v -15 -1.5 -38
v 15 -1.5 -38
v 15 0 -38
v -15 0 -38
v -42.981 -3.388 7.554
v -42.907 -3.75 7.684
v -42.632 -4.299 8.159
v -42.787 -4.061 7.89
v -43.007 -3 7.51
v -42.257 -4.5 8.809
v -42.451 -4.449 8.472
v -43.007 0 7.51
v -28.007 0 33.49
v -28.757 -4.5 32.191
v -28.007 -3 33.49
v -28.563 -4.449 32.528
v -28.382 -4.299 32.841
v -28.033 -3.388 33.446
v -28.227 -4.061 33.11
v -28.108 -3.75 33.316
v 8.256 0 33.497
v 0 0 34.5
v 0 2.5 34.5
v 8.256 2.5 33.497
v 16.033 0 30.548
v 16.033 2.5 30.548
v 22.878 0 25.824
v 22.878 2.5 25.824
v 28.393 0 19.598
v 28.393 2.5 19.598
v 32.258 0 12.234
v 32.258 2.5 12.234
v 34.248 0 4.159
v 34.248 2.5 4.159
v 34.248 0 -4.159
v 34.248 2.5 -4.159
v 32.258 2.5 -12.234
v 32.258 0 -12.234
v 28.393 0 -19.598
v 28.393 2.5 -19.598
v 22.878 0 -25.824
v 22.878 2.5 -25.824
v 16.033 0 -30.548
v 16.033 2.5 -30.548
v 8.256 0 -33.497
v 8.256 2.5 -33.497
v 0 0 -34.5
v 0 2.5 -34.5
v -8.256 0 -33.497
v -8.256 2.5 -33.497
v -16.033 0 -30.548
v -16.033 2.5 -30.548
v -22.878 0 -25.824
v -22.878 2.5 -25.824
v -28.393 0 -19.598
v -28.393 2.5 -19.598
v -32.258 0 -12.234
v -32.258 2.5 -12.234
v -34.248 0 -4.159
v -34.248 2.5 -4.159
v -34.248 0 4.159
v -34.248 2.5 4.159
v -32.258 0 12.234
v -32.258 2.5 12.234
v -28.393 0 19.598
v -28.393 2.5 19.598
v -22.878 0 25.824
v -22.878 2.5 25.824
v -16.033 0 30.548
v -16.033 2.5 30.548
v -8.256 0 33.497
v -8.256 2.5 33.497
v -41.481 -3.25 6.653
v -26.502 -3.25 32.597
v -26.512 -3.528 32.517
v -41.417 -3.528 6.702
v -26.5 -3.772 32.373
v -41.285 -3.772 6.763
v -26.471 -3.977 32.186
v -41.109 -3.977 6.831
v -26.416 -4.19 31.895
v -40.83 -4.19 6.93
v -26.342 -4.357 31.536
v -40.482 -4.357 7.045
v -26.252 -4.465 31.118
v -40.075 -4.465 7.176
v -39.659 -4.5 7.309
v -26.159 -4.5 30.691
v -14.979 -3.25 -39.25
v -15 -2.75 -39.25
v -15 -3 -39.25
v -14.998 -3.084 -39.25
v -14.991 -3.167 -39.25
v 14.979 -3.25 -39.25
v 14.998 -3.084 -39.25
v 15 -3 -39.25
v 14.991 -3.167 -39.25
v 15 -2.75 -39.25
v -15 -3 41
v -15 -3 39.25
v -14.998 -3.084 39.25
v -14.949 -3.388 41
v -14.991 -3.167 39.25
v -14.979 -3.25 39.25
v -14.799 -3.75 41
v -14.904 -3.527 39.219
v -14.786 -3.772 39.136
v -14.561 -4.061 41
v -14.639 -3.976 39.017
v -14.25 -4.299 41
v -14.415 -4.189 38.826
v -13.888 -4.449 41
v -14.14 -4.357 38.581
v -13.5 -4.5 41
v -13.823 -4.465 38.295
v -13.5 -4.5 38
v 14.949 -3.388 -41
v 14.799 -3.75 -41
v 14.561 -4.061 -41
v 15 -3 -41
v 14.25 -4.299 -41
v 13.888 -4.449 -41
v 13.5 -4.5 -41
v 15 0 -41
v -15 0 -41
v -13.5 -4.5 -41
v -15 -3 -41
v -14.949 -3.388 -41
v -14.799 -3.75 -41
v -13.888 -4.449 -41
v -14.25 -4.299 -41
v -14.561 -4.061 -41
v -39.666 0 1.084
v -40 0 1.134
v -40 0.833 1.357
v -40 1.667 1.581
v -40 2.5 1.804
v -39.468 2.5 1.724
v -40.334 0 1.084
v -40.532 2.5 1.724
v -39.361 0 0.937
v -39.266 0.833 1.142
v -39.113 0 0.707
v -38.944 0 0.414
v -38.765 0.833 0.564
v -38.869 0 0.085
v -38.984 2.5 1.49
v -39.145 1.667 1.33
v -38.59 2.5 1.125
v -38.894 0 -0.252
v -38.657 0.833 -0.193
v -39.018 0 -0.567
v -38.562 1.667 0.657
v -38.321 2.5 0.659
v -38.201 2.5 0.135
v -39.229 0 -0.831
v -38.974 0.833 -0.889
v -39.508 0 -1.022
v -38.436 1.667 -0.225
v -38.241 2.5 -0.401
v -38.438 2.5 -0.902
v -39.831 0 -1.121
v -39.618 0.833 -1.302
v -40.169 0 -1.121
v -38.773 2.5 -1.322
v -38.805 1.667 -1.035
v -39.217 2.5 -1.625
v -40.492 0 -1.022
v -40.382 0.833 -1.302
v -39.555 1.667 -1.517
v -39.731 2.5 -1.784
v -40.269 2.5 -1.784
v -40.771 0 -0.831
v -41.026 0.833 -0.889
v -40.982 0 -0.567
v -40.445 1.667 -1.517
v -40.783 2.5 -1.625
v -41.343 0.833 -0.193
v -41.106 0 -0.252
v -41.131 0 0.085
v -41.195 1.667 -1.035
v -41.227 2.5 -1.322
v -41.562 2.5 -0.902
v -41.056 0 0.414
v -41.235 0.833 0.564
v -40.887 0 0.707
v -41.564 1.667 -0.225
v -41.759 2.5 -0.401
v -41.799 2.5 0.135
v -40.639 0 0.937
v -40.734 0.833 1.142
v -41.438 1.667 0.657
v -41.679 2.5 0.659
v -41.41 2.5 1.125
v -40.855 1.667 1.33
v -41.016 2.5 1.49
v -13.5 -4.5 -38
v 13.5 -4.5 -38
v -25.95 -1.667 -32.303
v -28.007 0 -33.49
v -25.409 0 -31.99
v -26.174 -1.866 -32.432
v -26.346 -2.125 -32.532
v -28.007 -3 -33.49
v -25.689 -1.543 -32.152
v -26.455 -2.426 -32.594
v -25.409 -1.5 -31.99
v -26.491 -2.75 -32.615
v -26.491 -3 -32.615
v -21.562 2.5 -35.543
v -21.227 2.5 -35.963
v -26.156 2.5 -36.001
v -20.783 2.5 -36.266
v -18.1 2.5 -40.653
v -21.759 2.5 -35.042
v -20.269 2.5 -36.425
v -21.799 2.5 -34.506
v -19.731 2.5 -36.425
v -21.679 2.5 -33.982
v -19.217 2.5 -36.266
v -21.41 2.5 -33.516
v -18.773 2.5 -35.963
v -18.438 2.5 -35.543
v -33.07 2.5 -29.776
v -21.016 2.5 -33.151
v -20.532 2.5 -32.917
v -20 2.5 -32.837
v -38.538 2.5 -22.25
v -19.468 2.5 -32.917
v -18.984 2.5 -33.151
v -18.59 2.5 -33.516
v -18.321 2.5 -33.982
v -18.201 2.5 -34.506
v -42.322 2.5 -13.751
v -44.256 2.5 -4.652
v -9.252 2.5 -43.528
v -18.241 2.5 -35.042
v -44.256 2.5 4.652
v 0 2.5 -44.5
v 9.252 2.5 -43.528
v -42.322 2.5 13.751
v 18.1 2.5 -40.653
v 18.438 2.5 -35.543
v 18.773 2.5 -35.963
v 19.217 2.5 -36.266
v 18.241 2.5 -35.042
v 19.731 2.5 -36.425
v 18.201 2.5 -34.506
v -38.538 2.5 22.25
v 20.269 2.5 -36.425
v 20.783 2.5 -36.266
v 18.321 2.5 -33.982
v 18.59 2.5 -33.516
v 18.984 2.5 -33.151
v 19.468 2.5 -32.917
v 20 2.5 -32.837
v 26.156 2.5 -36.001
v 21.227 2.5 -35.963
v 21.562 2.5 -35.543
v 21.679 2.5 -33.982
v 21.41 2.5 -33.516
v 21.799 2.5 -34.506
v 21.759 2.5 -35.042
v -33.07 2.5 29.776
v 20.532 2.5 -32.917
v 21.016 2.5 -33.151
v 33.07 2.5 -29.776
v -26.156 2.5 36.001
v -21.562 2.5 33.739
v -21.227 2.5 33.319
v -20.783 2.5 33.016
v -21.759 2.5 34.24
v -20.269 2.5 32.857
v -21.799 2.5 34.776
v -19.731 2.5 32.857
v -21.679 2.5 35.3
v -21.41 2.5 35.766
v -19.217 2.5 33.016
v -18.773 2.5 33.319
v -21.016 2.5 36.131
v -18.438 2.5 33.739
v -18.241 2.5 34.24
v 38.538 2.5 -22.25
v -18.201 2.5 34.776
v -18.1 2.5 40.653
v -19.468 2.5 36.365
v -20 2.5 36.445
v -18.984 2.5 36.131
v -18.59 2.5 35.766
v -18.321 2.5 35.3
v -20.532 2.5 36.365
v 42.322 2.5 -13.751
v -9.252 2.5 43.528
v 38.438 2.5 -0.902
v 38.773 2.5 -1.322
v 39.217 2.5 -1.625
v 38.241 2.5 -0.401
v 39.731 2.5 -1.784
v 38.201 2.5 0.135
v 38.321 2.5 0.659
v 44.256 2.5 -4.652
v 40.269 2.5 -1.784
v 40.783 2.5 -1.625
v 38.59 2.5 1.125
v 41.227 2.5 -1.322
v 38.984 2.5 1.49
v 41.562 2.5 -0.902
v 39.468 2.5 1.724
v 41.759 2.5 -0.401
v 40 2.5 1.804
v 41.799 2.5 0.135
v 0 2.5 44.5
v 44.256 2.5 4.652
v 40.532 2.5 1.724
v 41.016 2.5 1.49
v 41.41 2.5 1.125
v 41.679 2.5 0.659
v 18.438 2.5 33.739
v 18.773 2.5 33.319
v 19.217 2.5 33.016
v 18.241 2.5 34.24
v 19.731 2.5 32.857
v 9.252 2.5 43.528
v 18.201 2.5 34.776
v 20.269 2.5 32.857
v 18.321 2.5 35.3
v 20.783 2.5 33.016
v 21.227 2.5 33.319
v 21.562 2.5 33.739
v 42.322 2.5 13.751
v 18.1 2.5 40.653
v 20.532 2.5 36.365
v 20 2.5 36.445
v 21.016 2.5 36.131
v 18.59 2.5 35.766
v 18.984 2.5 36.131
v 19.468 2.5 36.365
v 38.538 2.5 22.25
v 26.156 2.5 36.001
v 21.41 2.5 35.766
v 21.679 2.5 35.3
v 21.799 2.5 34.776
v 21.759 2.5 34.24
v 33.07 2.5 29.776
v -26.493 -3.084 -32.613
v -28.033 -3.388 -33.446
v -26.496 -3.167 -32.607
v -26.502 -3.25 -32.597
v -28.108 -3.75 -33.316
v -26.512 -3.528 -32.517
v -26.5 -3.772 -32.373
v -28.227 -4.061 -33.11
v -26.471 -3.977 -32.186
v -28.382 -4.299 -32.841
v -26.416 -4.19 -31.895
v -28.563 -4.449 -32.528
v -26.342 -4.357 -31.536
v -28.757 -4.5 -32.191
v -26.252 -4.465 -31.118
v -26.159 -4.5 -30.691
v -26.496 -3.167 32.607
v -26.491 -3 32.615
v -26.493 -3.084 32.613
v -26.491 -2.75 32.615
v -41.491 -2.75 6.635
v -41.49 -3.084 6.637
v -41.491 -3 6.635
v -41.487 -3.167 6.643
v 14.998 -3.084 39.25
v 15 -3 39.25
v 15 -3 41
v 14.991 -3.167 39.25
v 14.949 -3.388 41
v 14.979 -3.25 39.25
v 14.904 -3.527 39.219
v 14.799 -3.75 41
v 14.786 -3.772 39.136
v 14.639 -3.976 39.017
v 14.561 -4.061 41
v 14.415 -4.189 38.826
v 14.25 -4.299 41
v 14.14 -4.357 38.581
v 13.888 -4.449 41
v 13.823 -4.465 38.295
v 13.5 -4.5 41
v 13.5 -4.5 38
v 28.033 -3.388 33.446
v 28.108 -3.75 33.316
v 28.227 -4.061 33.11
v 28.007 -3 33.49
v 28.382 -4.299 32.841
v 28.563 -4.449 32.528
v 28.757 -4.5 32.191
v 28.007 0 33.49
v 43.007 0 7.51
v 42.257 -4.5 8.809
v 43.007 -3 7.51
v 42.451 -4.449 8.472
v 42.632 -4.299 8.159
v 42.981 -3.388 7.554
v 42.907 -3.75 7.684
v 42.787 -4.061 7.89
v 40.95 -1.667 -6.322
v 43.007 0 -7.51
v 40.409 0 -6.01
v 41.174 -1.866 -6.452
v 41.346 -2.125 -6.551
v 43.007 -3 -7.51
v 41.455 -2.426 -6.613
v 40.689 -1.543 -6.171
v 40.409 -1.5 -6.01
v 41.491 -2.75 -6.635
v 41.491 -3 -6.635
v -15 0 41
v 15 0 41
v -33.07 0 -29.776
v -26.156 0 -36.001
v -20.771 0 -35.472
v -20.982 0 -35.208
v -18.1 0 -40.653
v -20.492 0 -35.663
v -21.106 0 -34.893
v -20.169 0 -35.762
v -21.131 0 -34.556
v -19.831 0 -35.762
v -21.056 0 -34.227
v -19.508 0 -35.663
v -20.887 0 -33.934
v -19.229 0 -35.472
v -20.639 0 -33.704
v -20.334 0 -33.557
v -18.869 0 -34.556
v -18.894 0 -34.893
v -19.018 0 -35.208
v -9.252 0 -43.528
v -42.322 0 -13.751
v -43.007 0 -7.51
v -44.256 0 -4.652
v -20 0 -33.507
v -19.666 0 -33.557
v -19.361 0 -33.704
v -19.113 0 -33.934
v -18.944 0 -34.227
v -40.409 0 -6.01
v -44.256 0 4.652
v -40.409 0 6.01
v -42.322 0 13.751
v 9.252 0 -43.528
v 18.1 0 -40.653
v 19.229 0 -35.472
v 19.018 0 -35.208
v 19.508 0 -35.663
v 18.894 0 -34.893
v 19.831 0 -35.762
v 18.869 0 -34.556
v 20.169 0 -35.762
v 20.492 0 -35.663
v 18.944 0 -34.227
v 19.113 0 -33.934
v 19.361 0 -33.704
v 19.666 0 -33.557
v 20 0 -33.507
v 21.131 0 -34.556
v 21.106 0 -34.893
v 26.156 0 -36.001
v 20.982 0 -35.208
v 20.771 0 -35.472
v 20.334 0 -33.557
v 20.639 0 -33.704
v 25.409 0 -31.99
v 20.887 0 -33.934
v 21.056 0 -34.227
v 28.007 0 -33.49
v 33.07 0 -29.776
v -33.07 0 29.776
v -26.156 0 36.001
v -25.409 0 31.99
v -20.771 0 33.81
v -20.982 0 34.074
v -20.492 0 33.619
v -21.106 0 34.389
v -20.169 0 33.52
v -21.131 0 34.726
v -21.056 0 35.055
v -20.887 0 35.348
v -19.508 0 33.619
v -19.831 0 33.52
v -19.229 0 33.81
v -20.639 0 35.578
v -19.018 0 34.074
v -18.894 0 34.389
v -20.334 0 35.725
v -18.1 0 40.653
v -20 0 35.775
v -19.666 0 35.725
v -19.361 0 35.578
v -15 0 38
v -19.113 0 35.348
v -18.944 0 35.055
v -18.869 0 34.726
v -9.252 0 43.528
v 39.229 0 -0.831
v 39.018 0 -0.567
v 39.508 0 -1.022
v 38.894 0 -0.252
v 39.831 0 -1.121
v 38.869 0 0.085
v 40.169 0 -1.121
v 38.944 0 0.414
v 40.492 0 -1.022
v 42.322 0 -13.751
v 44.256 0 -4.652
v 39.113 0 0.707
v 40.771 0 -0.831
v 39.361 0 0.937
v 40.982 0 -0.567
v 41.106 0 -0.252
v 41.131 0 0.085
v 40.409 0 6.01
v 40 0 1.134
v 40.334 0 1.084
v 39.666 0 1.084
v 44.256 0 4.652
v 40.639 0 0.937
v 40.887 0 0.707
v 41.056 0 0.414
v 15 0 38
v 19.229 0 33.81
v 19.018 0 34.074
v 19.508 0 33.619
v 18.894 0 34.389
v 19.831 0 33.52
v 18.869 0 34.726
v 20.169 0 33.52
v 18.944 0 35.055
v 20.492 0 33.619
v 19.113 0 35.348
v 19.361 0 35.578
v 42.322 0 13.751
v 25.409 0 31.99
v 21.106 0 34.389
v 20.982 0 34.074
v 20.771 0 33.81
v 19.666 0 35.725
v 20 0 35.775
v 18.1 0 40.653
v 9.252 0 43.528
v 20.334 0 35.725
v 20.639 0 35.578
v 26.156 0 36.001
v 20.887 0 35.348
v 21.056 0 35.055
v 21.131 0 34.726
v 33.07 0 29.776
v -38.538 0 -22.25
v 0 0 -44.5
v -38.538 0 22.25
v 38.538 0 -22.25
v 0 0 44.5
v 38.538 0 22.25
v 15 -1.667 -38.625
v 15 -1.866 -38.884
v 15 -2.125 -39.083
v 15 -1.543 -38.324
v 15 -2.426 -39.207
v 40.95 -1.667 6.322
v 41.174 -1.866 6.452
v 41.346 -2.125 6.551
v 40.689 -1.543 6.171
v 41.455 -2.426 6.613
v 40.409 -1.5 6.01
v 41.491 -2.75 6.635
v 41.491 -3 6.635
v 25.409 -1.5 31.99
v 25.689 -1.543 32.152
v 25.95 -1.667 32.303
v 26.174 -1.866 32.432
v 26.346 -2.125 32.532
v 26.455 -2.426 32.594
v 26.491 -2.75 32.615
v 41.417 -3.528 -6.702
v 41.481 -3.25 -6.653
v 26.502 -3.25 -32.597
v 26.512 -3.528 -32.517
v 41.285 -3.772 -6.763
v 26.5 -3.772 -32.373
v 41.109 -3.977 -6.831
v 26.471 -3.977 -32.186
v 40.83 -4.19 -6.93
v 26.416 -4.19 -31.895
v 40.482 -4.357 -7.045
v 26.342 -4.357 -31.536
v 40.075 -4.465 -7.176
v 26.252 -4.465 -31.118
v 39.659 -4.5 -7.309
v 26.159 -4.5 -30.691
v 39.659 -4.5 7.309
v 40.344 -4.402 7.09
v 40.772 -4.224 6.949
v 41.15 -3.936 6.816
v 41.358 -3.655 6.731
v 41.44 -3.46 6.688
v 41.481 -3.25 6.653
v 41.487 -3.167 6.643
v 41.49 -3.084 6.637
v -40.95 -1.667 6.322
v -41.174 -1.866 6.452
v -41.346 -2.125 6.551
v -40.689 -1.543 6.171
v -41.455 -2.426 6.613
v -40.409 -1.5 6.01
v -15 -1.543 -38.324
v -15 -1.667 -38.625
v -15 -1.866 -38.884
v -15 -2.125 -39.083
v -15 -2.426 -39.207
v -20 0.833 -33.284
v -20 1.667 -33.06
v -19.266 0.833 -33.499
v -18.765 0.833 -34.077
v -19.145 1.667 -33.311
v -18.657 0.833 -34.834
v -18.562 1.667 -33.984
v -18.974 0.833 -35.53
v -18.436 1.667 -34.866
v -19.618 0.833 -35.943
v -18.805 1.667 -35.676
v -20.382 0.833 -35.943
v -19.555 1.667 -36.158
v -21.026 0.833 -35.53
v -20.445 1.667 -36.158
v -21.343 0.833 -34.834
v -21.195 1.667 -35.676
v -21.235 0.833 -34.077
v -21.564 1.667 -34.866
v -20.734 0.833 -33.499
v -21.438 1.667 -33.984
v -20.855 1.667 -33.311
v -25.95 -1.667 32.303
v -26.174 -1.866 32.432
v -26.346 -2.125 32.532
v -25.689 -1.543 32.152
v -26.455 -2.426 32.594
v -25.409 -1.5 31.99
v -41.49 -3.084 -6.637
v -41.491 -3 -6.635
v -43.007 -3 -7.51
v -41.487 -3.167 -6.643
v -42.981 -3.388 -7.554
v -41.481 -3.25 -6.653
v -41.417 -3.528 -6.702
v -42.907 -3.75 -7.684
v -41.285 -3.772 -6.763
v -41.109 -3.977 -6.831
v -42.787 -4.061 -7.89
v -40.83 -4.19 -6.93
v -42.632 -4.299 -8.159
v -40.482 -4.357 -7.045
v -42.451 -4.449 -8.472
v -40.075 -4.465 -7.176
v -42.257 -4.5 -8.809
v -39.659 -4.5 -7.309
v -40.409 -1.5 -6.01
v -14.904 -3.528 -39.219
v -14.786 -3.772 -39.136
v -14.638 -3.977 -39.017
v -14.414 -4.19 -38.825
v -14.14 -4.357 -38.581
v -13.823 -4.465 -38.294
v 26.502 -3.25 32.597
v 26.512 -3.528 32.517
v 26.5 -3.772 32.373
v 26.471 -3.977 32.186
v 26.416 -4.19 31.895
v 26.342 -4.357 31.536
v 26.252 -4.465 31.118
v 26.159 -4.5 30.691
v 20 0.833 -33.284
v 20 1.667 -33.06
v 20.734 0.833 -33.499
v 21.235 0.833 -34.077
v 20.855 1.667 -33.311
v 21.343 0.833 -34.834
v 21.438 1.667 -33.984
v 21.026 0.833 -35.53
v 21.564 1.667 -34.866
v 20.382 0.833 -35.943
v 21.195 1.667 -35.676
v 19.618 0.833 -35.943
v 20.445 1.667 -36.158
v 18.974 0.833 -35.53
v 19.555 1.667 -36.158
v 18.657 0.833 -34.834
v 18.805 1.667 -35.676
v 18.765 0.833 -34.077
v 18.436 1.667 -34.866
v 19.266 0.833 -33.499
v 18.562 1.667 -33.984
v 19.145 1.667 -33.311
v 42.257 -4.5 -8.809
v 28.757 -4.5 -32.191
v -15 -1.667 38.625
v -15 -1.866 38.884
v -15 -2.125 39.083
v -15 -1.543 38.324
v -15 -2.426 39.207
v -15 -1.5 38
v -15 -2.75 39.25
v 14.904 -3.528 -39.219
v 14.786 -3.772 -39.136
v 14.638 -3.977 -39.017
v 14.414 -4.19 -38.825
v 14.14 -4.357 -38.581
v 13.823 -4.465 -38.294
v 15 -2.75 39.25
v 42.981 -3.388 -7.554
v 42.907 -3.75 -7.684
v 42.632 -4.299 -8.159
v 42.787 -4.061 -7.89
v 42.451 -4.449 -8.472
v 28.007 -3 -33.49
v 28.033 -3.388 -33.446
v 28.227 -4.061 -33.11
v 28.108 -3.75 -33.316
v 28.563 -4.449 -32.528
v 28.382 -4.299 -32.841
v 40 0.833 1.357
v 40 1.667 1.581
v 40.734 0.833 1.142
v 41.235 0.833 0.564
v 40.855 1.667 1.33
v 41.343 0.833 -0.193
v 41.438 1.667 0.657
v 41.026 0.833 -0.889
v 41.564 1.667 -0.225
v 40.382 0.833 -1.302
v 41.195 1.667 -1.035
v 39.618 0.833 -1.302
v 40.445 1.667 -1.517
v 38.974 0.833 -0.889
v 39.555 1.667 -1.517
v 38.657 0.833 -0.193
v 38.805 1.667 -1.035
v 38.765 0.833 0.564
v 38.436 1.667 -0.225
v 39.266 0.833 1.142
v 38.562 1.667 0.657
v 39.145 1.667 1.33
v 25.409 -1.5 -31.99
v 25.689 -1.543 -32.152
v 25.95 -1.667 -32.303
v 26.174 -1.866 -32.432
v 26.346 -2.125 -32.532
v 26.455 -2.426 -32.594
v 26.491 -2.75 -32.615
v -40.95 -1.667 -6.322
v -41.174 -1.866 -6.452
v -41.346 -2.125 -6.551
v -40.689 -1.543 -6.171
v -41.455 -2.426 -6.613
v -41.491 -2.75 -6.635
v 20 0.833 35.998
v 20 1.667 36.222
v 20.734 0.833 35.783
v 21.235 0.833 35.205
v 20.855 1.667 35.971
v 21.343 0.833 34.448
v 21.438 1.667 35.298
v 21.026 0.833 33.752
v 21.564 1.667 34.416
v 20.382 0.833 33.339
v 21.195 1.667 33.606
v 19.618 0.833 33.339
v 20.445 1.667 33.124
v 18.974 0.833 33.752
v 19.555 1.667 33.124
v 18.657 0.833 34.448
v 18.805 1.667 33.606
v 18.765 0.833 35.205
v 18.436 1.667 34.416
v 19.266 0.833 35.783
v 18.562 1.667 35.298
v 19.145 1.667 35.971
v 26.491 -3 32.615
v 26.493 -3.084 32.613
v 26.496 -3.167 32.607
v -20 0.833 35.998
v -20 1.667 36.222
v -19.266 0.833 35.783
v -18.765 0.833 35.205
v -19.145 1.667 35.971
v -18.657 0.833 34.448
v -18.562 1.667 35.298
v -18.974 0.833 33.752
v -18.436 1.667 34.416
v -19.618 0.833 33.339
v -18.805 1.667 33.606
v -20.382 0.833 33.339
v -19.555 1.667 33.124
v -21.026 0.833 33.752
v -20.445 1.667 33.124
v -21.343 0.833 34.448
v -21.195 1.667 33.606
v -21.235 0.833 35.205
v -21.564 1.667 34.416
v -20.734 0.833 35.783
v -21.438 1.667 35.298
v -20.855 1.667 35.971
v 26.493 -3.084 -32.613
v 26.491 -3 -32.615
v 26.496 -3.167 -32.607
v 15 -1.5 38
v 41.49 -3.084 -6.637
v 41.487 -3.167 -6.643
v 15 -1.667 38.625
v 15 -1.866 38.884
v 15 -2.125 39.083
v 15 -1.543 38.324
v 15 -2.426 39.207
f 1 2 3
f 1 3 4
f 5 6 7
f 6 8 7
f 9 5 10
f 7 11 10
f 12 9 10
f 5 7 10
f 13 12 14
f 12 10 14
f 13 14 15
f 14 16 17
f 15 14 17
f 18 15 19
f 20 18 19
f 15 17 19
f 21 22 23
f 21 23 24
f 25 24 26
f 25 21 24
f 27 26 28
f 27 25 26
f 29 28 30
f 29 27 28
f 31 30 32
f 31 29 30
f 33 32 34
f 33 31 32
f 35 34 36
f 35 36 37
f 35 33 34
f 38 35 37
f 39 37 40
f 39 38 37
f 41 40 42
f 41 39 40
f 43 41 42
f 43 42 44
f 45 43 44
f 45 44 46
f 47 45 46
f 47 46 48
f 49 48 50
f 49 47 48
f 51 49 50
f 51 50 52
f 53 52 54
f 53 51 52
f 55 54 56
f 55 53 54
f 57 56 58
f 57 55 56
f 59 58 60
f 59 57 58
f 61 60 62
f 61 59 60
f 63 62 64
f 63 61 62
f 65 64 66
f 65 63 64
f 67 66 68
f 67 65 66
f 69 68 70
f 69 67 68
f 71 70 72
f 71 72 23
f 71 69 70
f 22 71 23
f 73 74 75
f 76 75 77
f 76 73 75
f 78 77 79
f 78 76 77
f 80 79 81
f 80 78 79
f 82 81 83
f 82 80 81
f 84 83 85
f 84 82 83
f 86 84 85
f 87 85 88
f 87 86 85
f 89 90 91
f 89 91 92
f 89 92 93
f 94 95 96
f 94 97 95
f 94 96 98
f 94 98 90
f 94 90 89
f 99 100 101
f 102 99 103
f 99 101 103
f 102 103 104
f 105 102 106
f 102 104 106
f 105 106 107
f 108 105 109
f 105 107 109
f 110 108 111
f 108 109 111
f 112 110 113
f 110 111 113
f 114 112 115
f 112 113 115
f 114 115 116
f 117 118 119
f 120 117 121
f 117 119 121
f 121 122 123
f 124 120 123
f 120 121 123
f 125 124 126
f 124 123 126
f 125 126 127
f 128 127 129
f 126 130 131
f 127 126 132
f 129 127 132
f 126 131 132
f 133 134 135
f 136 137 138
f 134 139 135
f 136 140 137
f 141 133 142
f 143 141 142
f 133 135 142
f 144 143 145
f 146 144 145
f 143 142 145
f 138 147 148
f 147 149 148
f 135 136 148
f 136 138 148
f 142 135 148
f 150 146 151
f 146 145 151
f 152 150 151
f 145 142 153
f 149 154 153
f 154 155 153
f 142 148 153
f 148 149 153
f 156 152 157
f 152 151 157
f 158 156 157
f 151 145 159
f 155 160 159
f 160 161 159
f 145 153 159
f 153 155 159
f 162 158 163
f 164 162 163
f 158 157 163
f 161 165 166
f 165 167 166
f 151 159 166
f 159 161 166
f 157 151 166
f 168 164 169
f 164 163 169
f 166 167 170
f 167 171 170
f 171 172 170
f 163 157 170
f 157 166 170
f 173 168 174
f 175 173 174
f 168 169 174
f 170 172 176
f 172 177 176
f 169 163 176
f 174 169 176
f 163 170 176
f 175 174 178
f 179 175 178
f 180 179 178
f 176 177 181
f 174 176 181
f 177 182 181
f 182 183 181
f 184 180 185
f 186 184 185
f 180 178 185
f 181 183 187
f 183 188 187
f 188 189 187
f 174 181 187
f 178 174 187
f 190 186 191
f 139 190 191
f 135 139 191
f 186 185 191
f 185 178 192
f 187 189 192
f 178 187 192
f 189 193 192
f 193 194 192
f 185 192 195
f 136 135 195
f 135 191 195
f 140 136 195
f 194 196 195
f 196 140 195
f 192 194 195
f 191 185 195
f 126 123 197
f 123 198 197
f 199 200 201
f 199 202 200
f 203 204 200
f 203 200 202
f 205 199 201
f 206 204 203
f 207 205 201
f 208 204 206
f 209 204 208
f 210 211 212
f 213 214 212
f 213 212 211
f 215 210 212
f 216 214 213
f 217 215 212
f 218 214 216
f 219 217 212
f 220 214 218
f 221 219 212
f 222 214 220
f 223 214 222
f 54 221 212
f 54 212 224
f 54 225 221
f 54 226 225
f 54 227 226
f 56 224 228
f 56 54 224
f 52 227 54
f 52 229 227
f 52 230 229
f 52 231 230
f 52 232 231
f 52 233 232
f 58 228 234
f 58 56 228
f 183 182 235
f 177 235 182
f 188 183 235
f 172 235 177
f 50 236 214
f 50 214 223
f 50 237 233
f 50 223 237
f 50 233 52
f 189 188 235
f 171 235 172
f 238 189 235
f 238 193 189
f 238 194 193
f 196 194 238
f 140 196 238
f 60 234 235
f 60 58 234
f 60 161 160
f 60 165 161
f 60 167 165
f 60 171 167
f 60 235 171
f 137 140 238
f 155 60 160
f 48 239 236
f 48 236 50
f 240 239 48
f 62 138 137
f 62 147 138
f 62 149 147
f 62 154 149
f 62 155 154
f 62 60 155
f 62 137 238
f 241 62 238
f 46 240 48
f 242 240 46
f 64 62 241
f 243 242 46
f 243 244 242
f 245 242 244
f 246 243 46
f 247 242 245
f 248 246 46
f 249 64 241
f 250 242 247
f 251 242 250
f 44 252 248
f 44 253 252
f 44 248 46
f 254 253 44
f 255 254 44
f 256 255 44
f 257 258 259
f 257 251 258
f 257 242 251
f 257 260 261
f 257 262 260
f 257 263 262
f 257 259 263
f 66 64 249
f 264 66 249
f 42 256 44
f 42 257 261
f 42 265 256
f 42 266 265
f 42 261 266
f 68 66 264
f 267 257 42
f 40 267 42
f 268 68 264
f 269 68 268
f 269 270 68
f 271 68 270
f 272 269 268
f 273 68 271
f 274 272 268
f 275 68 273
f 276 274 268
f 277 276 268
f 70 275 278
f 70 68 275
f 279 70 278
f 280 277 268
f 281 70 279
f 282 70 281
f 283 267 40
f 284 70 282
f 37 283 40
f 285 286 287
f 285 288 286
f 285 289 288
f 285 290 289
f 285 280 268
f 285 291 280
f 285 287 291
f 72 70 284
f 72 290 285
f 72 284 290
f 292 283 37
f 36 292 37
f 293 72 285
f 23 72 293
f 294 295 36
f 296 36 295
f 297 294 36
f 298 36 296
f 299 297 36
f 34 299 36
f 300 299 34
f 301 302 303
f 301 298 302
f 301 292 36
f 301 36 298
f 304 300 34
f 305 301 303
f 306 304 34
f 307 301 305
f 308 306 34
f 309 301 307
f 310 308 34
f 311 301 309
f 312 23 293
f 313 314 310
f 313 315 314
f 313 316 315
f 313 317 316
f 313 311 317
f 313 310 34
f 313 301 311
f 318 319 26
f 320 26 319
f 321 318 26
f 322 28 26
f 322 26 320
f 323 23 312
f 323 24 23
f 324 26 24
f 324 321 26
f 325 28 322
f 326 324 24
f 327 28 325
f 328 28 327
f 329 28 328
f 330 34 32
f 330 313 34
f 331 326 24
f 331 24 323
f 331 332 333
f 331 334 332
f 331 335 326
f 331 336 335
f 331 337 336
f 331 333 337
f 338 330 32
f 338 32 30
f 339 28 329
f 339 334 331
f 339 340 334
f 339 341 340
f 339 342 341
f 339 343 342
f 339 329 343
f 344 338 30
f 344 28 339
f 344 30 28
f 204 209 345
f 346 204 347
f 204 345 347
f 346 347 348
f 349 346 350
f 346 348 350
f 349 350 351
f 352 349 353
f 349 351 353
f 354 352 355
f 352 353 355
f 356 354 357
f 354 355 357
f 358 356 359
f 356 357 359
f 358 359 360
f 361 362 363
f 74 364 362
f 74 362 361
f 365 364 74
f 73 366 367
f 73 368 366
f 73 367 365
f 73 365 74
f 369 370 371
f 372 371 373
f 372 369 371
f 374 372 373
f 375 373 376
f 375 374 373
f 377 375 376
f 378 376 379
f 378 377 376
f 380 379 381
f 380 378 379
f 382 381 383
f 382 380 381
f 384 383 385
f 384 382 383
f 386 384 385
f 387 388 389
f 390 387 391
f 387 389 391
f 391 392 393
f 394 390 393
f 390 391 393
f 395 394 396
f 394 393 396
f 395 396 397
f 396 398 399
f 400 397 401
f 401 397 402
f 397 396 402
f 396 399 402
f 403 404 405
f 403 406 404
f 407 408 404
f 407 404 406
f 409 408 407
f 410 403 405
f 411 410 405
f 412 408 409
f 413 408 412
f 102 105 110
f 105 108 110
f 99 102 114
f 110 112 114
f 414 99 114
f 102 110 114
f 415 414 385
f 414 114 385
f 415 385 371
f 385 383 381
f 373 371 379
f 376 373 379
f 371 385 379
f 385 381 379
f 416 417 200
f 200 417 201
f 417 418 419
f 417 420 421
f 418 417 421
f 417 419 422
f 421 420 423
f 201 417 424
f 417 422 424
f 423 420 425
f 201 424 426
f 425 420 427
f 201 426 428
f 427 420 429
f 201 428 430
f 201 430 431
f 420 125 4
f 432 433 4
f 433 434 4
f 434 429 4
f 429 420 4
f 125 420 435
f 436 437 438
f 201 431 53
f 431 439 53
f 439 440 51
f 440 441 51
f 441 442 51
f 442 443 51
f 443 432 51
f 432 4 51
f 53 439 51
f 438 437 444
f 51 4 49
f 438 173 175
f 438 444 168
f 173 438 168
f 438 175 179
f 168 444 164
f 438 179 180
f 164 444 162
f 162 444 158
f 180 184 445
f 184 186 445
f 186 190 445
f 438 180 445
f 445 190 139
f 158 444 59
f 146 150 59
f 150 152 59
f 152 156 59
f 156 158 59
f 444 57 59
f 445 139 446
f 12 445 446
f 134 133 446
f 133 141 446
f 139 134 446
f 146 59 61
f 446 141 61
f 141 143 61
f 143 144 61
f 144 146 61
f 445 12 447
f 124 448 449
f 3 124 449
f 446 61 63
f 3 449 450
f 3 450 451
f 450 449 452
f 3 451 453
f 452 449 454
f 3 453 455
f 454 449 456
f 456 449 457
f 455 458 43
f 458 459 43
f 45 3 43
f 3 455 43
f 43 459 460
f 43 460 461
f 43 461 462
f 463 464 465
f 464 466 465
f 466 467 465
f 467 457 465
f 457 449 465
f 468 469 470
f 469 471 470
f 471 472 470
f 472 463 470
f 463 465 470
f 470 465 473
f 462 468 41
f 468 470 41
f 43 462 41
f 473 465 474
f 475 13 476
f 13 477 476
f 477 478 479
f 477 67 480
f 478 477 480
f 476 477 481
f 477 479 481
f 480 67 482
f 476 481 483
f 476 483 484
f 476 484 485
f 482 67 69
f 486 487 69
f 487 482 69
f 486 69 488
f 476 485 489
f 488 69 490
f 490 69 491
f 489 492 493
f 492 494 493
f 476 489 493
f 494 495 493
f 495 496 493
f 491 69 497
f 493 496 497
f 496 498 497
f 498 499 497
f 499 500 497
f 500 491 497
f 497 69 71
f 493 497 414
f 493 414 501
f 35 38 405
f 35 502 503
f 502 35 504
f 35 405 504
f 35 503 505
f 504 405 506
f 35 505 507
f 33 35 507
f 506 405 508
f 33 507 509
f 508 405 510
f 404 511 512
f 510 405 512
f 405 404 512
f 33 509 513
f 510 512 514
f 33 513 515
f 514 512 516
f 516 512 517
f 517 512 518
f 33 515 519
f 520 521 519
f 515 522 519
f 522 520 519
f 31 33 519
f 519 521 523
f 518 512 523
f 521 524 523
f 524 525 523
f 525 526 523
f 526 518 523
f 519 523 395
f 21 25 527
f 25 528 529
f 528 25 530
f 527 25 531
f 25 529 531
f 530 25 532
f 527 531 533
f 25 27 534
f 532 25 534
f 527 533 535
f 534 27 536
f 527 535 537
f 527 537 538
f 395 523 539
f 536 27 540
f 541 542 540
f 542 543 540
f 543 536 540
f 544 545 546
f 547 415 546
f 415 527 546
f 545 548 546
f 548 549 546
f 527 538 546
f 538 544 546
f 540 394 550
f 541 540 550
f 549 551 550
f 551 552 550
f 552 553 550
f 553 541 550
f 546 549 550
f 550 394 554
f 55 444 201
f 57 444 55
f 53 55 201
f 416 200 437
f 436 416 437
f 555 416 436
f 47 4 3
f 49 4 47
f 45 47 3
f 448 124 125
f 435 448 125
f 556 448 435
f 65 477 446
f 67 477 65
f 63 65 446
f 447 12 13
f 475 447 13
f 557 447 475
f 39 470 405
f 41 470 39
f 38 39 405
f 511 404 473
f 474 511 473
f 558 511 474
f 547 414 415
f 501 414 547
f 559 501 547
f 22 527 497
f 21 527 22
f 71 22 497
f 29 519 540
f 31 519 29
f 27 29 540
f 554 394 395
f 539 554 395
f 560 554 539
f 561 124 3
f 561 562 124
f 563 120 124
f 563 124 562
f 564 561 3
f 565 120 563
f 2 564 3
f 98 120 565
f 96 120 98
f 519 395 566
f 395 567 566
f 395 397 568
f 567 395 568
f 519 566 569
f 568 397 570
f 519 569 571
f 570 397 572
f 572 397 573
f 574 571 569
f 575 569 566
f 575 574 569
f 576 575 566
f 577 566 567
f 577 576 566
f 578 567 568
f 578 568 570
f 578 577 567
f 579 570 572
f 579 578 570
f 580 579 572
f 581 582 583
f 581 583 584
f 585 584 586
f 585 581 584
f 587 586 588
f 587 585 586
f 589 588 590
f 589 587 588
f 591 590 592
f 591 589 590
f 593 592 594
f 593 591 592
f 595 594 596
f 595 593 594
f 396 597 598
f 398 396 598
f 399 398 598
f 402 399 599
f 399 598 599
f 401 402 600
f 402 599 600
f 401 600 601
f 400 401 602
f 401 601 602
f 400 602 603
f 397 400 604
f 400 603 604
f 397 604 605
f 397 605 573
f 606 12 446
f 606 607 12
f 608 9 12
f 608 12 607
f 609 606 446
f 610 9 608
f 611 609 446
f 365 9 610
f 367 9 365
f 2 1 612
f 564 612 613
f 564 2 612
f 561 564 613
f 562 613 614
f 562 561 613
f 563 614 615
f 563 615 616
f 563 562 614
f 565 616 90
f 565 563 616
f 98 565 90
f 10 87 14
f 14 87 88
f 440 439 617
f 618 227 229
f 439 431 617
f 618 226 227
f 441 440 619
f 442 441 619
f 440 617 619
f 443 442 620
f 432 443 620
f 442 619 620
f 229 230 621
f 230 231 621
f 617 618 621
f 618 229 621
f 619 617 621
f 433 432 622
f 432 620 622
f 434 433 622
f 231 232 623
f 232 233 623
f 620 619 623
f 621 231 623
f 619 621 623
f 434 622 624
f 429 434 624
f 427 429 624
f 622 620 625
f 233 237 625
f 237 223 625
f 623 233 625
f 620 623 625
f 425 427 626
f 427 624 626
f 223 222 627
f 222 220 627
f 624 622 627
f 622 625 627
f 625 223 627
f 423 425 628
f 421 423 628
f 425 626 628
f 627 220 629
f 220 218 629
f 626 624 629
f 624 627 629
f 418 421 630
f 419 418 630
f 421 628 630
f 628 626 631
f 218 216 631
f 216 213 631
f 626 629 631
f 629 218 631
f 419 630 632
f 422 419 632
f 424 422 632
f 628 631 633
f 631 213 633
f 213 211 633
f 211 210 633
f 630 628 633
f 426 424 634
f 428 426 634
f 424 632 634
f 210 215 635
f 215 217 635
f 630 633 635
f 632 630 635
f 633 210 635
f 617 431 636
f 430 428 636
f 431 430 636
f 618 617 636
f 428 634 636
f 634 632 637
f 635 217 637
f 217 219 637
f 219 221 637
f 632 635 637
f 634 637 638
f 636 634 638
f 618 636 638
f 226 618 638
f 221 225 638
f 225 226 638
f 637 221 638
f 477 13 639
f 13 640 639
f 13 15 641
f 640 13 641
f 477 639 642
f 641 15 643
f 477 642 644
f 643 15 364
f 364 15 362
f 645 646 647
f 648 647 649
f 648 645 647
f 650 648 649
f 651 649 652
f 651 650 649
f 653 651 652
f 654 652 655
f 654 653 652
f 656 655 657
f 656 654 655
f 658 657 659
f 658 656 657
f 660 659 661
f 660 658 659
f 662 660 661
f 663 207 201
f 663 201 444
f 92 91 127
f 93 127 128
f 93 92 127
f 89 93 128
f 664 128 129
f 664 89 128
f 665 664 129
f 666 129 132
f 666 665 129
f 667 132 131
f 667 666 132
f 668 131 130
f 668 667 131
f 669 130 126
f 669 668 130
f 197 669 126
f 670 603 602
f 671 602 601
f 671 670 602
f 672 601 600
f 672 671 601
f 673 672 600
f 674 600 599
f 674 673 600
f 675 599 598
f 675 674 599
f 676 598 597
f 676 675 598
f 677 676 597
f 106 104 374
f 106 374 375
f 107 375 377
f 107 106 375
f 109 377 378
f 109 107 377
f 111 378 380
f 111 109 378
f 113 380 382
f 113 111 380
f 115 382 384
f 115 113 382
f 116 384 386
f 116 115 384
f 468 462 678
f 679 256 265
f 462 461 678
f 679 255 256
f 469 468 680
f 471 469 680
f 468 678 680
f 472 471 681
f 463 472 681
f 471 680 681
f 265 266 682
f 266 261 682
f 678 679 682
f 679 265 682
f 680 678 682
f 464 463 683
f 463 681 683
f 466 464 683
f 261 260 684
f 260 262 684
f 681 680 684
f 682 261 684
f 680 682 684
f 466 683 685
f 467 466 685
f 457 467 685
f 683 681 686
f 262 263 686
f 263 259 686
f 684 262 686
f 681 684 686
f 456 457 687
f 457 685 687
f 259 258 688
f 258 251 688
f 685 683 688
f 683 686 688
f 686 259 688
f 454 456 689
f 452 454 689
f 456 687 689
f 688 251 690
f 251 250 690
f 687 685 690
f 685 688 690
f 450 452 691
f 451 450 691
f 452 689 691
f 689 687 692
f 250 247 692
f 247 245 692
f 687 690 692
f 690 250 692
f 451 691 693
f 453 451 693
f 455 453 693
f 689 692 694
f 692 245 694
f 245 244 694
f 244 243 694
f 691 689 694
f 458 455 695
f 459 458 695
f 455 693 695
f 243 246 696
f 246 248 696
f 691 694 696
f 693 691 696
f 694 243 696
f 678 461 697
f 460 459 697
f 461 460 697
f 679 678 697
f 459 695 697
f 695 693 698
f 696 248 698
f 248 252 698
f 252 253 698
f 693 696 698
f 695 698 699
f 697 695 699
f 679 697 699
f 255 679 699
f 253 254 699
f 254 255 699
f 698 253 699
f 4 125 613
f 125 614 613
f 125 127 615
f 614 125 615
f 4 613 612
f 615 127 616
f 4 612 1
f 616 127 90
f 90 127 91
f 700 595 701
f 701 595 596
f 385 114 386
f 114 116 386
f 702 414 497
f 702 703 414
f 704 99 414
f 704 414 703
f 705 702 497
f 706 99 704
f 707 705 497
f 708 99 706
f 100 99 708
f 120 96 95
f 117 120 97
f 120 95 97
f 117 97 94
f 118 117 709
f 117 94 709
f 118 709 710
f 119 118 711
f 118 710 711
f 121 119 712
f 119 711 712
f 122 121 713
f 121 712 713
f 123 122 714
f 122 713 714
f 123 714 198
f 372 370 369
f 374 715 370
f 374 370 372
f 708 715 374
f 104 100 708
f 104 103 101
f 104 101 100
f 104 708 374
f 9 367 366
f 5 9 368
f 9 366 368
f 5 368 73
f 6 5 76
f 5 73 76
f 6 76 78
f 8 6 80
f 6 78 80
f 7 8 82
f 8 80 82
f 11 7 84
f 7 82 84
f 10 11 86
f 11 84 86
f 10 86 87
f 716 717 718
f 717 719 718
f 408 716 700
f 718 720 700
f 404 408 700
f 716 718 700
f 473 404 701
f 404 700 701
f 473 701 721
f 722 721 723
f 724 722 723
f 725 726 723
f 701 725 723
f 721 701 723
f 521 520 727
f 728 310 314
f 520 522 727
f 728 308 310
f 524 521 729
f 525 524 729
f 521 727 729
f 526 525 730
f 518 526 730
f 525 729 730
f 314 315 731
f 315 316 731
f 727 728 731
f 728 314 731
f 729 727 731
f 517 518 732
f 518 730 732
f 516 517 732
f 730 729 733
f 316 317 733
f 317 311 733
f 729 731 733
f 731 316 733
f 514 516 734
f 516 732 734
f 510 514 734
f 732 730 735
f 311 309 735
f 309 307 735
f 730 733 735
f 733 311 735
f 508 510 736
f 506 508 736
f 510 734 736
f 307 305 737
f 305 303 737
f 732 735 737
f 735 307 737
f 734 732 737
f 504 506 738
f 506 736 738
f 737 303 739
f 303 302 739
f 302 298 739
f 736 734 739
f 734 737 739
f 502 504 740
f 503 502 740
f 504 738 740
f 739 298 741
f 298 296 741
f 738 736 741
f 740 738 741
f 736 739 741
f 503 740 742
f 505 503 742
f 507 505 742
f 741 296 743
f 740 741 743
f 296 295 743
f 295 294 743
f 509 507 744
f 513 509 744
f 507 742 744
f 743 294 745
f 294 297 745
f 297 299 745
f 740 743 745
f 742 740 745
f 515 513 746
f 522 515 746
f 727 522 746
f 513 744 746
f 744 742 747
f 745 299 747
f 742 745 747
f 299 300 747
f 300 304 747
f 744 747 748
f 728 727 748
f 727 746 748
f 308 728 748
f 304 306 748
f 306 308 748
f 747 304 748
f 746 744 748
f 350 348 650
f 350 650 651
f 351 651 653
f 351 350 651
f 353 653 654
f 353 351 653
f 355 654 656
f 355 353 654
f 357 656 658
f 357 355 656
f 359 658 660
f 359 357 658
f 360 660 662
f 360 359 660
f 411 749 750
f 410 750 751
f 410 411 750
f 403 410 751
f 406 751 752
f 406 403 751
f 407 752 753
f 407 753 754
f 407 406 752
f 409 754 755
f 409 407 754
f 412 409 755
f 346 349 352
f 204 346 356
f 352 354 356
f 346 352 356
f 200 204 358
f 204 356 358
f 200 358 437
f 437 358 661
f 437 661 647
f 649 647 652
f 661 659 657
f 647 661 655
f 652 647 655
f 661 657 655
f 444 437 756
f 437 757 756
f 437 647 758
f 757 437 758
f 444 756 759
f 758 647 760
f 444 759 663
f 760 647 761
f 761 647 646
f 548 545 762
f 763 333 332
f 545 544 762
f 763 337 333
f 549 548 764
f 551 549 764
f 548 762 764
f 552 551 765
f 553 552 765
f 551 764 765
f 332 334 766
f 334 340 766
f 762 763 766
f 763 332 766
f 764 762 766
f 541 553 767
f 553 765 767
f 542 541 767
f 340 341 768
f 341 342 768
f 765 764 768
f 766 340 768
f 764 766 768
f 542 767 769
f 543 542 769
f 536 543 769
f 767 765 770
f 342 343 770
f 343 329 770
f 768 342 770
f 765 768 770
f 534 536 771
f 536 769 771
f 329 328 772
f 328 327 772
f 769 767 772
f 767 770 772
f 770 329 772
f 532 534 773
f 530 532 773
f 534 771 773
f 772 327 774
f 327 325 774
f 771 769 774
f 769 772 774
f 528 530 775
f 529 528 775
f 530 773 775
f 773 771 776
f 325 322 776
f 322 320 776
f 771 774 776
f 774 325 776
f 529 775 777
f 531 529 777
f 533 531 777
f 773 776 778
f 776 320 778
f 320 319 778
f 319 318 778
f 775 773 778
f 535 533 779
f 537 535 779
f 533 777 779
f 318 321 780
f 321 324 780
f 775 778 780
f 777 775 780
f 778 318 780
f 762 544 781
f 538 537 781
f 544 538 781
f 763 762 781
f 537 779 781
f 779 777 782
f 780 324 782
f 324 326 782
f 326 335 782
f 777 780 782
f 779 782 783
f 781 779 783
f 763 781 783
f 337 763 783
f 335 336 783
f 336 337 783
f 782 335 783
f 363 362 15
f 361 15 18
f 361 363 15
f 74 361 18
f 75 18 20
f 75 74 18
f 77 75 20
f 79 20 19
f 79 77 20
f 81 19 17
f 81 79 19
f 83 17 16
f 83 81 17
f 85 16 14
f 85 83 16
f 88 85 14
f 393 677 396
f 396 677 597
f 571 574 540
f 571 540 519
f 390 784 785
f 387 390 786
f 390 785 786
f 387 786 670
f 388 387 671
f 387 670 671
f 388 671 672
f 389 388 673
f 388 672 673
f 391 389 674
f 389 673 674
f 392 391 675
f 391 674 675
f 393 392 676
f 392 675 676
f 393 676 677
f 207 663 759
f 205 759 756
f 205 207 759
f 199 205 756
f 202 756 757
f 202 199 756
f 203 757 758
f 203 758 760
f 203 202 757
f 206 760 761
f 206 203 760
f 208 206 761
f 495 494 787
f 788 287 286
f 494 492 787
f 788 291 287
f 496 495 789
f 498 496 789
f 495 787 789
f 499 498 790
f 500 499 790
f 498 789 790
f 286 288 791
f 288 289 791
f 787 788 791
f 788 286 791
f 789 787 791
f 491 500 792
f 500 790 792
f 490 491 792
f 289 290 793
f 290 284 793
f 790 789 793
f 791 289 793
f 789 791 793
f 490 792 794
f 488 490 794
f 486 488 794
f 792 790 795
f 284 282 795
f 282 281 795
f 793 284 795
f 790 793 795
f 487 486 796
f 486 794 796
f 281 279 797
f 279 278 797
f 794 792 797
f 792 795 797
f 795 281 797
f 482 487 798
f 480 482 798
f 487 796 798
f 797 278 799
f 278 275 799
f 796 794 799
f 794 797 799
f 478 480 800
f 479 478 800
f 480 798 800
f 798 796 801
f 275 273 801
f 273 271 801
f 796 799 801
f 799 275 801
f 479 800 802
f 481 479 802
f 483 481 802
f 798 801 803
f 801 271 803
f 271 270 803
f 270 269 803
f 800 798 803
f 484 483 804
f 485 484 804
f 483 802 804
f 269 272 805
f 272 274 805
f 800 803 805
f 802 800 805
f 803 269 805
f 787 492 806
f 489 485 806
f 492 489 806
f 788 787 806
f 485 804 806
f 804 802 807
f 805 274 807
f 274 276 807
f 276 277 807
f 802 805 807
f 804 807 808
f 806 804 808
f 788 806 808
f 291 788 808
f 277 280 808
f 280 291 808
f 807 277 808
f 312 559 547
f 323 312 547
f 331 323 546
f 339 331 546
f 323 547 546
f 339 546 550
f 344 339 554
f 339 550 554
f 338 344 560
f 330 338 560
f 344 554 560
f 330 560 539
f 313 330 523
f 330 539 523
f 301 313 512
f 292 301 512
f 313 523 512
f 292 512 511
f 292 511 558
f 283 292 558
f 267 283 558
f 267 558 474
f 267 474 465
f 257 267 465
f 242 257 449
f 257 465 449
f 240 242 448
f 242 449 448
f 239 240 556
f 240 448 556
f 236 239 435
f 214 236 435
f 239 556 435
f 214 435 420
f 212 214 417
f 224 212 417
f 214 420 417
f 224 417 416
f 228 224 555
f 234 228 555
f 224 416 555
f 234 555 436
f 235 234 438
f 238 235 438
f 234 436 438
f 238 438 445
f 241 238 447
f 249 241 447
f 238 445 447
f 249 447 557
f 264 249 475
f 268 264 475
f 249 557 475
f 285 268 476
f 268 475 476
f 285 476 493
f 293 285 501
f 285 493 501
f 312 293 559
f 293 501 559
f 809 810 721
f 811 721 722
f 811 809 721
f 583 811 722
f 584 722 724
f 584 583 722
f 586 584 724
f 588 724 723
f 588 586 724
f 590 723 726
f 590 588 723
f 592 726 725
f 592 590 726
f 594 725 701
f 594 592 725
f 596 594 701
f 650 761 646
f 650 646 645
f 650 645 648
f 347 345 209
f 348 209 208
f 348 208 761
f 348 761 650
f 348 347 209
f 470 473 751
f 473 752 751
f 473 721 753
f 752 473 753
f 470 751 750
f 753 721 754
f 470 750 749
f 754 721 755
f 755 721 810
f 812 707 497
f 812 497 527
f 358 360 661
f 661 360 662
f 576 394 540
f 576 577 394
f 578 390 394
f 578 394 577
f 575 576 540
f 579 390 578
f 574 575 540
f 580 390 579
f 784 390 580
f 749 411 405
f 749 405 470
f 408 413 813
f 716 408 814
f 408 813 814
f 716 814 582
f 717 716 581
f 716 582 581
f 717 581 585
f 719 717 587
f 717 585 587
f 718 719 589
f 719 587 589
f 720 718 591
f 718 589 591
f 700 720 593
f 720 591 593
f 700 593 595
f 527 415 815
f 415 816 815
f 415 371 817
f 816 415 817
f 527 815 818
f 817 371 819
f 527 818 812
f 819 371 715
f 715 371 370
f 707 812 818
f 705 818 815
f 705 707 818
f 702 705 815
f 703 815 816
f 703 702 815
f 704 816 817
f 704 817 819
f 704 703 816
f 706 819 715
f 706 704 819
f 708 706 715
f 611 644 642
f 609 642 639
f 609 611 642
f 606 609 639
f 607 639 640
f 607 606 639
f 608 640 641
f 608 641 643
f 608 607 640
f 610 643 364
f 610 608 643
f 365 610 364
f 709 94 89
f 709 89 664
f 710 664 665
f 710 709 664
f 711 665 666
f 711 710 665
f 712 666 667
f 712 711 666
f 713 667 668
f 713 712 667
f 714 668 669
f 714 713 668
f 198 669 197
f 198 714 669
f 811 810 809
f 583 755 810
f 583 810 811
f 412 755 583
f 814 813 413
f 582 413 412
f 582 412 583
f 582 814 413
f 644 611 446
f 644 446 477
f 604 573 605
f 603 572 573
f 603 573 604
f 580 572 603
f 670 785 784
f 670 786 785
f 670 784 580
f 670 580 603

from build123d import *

# Parameters (mm, degrees)
BOSS_EXTRUDE2_START       = -4.5
SKETCH1_W                 = 30
SKETCH1_H                 = 3
BOSS_EXTRUDE2_DEPTH       = 5.5
SKETCH3_R                 = 44.5
SKETCH3_R_2               = 34.5
SKETCH3_R_3               = 1
BOSS_EXTRUDE3_DEPTH       = 2.5
CHAMFER1_SIZE             = 3
CHAMFER1_SIZE_2           = 0.803847577
FILLET1_R                 = 1.5
F_1_0MM_START             = -15
F_1_0MM_DOWEL_SLOT1_DEPTH = 30
CIRPATTERN1_COUNT         = 6
FILLET1_OF_CIRPATTERN1_R  = 1.5


# Read off the part's stored shape, not the designer's step: Ø1.0mm Dowel Slot1
with BuildPart() as part:
    # Sketch1 → Boss-Extrude2 (new body)
    with BuildSketch(Plane(origin=(0, 0, 0), x_dir=(1, 0, 0), z_dir=(0, 1, 0)).offset(BOSS_EXTRUDE2_START)):
        with Locations((0, -39.5)):
            Rectangle(SKETCH1_W, SKETCH1_H)
    boss_extrude2 = extrude(amount=BOSS_EXTRUDE2_DEPTH)

    # Sketch3 → Boss-Extrude3 (add)
    with BuildSketch(Plane(origin=(0, 0, 0), x_dir=(1, 0, 0), z_dir=(0, 1, 0))):
        with Locations(Location((0, 0, 0), (0, 0, 270))):
            Circle(SKETCH3_R)
        with Locations(Location((0, 0, 0), (0, 0, 270))):
            Circle(SKETCH3_R_2, mode=Mode.SUBTRACT)
        with Locations(Location((-20, 34.641016151, 0), (0, 0, 270))):
            Circle(SKETCH3_R_3, mode=Mode.SUBTRACT)
        with Locations(Location((20, 34.641016151, 0), (0, 0, 270))):
            Circle(SKETCH3_R_3, mode=Mode.SUBTRACT)
        with Locations(Location((40, 0, 0), (0, 0, 270))):
            Circle(SKETCH3_R_3, mode=Mode.SUBTRACT)
        with Locations(Location((20, -34.641016151, 0), (0, 0, 270))):
            Circle(SKETCH3_R_3, mode=Mode.SUBTRACT)
        with Locations(Location((-20, -34.641016151, 0), (0, 0, 270))):
            Circle(SKETCH3_R_3, mode=Mode.SUBTRACT)
        with Locations(Location((-40, 0, 0), (0, 0, 270))):
            Circle(SKETCH3_R_3, mode=Mode.SUBTRACT)
    extrude(amount=BOSS_EXTRUDE3_DEPTH)

    # Chamfer1
    # the kernel refuses this chamfer: 3, 0.803847577 mm, written as the material it takes off along each edge
    with BuildSketch(Plane(origin=(20, 2.5, 34.641016151), x_dir=(0, 0, 1), z_dir=(-1, 0, 0))) as chamfer1_piece_1:
        Polygon((1, -CHAMFER1_SIZE), (1 + CHAMFER1_SIZE_2, 0), (1, 0), align=None)
    revolve(axis=Axis((20, 2.5, 34.641016151), (0, 1, 0)), mode=Mode.SUBTRACT)
    with BuildSketch(Plane(origin=(40, 2.5, 0), x_dir=(0, 0, 1), z_dir=(-1, 0, 0))) as chamfer1_piece_2:
        Polygon((1, -CHAMFER1_SIZE), (1 + CHAMFER1_SIZE_2, 0), (1, 0), align=None)
    revolve(axis=Axis((40, 2.5, 0), (0, 1, 0)), mode=Mode.SUBTRACT)
    with BuildSketch(Plane(origin=(20, 2.5, -34.641016151), x_dir=(0, 0, 1), z_dir=(-1, 0, 0))) as chamfer1_piece_3:
        Polygon((1, -CHAMFER1_SIZE), (1 + CHAMFER1_SIZE_2, 0), (1, 0), align=None)
    revolve(axis=Axis((20, 2.5, -34.641016151), (0, 1, 0)), mode=Mode.SUBTRACT)
    with BuildSketch(Plane(origin=(-20, 2.5, -34.641016151), x_dir=(0, 0, 1), z_dir=(-1, 0, 0))) as chamfer1_piece_4:
        Polygon((1, -CHAMFER1_SIZE), (1 + CHAMFER1_SIZE_2, 0), (1, 0), align=None)
    revolve(axis=Axis((-20, 2.5, -34.641016151), (0, 1, 0)), mode=Mode.SUBTRACT)
    with BuildSketch(Plane(origin=(-40, 2.5, 0), x_dir=(0, 0, 1), z_dir=(-1, 0, 0))) as chamfer1_piece_5:
        Polygon((1, -CHAMFER1_SIZE), (1 + CHAMFER1_SIZE_2, 0), (1, 0), align=None)
    revolve(axis=Axis((-40, 2.5, 0), (0, 1, 0)), mode=Mode.SUBTRACT)
    with BuildSketch(Plane(origin=(-20, 2.5, 34.641016151), x_dir=(0, 0, 1), z_dir=(-1, 0, 0))) as chamfer1_piece_6:
        Polygon((1, -CHAMFER1_SIZE), (1 + CHAMFER1_SIZE_2, 0), (1, 0), align=None)
    revolve(axis=Axis((-20, 2.5, 34.641016151), (0, 1, 0)), mode=Mode.SUBTRACT)

    # Fillet1
    fillet1_edges = [part.edges().sort_by_distance(p)[0] for p in [
        (-15, -4.5, 39.5),
        (15, -4.5, 39.5),
    ]]
    fillet(fillet1_edges, radius=FILLET1_R)

    # Ø1.0mm Dowel Slot1 outline → Ø1.0mm Dowel Slot1 (cut)
    with BuildSketch(Plane.YZ.offset(F_1_0MM_START)):
        with BuildLine():
            ThreePointArc((-1.5, 38), (-1.866116524, 38.883883476), (-2.75, 39.25))
            Line((-2.75, 39.25), (-3.25, 39.25))
            ThreePointArc((-3.25, 39.25), (-4.133883476, 38.883883476), (-4.5, 38))
            Line((-4.5, 38), (-1.5, 38))
        make_face()
    f_1_0mm_dowel_slot1 = extrude(amount=F_1_0MM_DOWEL_SLOT1_DEPTH, mode=Mode.SUBTRACT)

    # CirPattern1: Boss-Extrude2, Ø1.0mm Dowel Slot1 ×6 about axis
    cirpattern1_axis = Axis((0, 0, 0), (0, 1, 0))
    add([boss_extrude2.rotate(cirpattern1_axis, i * 360 / CIRPATTERN1_COUNT) for i in range(1, CIRPATTERN1_COUNT)])
    add([f_1_0mm_dowel_slot1.rotate(cirpattern1_axis, i * 360 / CIRPATTERN1_COUNT) for i in range(1, CIRPATTERN1_COUNT)], mode=Mode.SUBTRACT)

    # Fillet1 of CirPattern1
    fillet1_of_cirpattern1_edges = [part.edges().sort_by_distance(p)[0] for p in [
        (26.708003449, -4.5, 32.740381057),
        (41.708003449, -4.5, 6.759618943),
        (41.708003449, -4.5, -6.759618943),
        (26.708003449, -4.5, -32.740381057),
        (15, -4.5, -39.5),
        (-15, -4.5, -39.5),
        (-26.708003449, -4.5, -32.740381057),
        (-41.708003449, -4.5, -6.759618943),
        (-41.708003449, -4.5, 6.759618943),
        (-26.708003449, -4.5, 32.740381057),
    ]]
    fillet(fillet1_of_cirpattern1_edges, radius=FILLET1_OF_CIRPATTERN1_R)


solid = part.part
